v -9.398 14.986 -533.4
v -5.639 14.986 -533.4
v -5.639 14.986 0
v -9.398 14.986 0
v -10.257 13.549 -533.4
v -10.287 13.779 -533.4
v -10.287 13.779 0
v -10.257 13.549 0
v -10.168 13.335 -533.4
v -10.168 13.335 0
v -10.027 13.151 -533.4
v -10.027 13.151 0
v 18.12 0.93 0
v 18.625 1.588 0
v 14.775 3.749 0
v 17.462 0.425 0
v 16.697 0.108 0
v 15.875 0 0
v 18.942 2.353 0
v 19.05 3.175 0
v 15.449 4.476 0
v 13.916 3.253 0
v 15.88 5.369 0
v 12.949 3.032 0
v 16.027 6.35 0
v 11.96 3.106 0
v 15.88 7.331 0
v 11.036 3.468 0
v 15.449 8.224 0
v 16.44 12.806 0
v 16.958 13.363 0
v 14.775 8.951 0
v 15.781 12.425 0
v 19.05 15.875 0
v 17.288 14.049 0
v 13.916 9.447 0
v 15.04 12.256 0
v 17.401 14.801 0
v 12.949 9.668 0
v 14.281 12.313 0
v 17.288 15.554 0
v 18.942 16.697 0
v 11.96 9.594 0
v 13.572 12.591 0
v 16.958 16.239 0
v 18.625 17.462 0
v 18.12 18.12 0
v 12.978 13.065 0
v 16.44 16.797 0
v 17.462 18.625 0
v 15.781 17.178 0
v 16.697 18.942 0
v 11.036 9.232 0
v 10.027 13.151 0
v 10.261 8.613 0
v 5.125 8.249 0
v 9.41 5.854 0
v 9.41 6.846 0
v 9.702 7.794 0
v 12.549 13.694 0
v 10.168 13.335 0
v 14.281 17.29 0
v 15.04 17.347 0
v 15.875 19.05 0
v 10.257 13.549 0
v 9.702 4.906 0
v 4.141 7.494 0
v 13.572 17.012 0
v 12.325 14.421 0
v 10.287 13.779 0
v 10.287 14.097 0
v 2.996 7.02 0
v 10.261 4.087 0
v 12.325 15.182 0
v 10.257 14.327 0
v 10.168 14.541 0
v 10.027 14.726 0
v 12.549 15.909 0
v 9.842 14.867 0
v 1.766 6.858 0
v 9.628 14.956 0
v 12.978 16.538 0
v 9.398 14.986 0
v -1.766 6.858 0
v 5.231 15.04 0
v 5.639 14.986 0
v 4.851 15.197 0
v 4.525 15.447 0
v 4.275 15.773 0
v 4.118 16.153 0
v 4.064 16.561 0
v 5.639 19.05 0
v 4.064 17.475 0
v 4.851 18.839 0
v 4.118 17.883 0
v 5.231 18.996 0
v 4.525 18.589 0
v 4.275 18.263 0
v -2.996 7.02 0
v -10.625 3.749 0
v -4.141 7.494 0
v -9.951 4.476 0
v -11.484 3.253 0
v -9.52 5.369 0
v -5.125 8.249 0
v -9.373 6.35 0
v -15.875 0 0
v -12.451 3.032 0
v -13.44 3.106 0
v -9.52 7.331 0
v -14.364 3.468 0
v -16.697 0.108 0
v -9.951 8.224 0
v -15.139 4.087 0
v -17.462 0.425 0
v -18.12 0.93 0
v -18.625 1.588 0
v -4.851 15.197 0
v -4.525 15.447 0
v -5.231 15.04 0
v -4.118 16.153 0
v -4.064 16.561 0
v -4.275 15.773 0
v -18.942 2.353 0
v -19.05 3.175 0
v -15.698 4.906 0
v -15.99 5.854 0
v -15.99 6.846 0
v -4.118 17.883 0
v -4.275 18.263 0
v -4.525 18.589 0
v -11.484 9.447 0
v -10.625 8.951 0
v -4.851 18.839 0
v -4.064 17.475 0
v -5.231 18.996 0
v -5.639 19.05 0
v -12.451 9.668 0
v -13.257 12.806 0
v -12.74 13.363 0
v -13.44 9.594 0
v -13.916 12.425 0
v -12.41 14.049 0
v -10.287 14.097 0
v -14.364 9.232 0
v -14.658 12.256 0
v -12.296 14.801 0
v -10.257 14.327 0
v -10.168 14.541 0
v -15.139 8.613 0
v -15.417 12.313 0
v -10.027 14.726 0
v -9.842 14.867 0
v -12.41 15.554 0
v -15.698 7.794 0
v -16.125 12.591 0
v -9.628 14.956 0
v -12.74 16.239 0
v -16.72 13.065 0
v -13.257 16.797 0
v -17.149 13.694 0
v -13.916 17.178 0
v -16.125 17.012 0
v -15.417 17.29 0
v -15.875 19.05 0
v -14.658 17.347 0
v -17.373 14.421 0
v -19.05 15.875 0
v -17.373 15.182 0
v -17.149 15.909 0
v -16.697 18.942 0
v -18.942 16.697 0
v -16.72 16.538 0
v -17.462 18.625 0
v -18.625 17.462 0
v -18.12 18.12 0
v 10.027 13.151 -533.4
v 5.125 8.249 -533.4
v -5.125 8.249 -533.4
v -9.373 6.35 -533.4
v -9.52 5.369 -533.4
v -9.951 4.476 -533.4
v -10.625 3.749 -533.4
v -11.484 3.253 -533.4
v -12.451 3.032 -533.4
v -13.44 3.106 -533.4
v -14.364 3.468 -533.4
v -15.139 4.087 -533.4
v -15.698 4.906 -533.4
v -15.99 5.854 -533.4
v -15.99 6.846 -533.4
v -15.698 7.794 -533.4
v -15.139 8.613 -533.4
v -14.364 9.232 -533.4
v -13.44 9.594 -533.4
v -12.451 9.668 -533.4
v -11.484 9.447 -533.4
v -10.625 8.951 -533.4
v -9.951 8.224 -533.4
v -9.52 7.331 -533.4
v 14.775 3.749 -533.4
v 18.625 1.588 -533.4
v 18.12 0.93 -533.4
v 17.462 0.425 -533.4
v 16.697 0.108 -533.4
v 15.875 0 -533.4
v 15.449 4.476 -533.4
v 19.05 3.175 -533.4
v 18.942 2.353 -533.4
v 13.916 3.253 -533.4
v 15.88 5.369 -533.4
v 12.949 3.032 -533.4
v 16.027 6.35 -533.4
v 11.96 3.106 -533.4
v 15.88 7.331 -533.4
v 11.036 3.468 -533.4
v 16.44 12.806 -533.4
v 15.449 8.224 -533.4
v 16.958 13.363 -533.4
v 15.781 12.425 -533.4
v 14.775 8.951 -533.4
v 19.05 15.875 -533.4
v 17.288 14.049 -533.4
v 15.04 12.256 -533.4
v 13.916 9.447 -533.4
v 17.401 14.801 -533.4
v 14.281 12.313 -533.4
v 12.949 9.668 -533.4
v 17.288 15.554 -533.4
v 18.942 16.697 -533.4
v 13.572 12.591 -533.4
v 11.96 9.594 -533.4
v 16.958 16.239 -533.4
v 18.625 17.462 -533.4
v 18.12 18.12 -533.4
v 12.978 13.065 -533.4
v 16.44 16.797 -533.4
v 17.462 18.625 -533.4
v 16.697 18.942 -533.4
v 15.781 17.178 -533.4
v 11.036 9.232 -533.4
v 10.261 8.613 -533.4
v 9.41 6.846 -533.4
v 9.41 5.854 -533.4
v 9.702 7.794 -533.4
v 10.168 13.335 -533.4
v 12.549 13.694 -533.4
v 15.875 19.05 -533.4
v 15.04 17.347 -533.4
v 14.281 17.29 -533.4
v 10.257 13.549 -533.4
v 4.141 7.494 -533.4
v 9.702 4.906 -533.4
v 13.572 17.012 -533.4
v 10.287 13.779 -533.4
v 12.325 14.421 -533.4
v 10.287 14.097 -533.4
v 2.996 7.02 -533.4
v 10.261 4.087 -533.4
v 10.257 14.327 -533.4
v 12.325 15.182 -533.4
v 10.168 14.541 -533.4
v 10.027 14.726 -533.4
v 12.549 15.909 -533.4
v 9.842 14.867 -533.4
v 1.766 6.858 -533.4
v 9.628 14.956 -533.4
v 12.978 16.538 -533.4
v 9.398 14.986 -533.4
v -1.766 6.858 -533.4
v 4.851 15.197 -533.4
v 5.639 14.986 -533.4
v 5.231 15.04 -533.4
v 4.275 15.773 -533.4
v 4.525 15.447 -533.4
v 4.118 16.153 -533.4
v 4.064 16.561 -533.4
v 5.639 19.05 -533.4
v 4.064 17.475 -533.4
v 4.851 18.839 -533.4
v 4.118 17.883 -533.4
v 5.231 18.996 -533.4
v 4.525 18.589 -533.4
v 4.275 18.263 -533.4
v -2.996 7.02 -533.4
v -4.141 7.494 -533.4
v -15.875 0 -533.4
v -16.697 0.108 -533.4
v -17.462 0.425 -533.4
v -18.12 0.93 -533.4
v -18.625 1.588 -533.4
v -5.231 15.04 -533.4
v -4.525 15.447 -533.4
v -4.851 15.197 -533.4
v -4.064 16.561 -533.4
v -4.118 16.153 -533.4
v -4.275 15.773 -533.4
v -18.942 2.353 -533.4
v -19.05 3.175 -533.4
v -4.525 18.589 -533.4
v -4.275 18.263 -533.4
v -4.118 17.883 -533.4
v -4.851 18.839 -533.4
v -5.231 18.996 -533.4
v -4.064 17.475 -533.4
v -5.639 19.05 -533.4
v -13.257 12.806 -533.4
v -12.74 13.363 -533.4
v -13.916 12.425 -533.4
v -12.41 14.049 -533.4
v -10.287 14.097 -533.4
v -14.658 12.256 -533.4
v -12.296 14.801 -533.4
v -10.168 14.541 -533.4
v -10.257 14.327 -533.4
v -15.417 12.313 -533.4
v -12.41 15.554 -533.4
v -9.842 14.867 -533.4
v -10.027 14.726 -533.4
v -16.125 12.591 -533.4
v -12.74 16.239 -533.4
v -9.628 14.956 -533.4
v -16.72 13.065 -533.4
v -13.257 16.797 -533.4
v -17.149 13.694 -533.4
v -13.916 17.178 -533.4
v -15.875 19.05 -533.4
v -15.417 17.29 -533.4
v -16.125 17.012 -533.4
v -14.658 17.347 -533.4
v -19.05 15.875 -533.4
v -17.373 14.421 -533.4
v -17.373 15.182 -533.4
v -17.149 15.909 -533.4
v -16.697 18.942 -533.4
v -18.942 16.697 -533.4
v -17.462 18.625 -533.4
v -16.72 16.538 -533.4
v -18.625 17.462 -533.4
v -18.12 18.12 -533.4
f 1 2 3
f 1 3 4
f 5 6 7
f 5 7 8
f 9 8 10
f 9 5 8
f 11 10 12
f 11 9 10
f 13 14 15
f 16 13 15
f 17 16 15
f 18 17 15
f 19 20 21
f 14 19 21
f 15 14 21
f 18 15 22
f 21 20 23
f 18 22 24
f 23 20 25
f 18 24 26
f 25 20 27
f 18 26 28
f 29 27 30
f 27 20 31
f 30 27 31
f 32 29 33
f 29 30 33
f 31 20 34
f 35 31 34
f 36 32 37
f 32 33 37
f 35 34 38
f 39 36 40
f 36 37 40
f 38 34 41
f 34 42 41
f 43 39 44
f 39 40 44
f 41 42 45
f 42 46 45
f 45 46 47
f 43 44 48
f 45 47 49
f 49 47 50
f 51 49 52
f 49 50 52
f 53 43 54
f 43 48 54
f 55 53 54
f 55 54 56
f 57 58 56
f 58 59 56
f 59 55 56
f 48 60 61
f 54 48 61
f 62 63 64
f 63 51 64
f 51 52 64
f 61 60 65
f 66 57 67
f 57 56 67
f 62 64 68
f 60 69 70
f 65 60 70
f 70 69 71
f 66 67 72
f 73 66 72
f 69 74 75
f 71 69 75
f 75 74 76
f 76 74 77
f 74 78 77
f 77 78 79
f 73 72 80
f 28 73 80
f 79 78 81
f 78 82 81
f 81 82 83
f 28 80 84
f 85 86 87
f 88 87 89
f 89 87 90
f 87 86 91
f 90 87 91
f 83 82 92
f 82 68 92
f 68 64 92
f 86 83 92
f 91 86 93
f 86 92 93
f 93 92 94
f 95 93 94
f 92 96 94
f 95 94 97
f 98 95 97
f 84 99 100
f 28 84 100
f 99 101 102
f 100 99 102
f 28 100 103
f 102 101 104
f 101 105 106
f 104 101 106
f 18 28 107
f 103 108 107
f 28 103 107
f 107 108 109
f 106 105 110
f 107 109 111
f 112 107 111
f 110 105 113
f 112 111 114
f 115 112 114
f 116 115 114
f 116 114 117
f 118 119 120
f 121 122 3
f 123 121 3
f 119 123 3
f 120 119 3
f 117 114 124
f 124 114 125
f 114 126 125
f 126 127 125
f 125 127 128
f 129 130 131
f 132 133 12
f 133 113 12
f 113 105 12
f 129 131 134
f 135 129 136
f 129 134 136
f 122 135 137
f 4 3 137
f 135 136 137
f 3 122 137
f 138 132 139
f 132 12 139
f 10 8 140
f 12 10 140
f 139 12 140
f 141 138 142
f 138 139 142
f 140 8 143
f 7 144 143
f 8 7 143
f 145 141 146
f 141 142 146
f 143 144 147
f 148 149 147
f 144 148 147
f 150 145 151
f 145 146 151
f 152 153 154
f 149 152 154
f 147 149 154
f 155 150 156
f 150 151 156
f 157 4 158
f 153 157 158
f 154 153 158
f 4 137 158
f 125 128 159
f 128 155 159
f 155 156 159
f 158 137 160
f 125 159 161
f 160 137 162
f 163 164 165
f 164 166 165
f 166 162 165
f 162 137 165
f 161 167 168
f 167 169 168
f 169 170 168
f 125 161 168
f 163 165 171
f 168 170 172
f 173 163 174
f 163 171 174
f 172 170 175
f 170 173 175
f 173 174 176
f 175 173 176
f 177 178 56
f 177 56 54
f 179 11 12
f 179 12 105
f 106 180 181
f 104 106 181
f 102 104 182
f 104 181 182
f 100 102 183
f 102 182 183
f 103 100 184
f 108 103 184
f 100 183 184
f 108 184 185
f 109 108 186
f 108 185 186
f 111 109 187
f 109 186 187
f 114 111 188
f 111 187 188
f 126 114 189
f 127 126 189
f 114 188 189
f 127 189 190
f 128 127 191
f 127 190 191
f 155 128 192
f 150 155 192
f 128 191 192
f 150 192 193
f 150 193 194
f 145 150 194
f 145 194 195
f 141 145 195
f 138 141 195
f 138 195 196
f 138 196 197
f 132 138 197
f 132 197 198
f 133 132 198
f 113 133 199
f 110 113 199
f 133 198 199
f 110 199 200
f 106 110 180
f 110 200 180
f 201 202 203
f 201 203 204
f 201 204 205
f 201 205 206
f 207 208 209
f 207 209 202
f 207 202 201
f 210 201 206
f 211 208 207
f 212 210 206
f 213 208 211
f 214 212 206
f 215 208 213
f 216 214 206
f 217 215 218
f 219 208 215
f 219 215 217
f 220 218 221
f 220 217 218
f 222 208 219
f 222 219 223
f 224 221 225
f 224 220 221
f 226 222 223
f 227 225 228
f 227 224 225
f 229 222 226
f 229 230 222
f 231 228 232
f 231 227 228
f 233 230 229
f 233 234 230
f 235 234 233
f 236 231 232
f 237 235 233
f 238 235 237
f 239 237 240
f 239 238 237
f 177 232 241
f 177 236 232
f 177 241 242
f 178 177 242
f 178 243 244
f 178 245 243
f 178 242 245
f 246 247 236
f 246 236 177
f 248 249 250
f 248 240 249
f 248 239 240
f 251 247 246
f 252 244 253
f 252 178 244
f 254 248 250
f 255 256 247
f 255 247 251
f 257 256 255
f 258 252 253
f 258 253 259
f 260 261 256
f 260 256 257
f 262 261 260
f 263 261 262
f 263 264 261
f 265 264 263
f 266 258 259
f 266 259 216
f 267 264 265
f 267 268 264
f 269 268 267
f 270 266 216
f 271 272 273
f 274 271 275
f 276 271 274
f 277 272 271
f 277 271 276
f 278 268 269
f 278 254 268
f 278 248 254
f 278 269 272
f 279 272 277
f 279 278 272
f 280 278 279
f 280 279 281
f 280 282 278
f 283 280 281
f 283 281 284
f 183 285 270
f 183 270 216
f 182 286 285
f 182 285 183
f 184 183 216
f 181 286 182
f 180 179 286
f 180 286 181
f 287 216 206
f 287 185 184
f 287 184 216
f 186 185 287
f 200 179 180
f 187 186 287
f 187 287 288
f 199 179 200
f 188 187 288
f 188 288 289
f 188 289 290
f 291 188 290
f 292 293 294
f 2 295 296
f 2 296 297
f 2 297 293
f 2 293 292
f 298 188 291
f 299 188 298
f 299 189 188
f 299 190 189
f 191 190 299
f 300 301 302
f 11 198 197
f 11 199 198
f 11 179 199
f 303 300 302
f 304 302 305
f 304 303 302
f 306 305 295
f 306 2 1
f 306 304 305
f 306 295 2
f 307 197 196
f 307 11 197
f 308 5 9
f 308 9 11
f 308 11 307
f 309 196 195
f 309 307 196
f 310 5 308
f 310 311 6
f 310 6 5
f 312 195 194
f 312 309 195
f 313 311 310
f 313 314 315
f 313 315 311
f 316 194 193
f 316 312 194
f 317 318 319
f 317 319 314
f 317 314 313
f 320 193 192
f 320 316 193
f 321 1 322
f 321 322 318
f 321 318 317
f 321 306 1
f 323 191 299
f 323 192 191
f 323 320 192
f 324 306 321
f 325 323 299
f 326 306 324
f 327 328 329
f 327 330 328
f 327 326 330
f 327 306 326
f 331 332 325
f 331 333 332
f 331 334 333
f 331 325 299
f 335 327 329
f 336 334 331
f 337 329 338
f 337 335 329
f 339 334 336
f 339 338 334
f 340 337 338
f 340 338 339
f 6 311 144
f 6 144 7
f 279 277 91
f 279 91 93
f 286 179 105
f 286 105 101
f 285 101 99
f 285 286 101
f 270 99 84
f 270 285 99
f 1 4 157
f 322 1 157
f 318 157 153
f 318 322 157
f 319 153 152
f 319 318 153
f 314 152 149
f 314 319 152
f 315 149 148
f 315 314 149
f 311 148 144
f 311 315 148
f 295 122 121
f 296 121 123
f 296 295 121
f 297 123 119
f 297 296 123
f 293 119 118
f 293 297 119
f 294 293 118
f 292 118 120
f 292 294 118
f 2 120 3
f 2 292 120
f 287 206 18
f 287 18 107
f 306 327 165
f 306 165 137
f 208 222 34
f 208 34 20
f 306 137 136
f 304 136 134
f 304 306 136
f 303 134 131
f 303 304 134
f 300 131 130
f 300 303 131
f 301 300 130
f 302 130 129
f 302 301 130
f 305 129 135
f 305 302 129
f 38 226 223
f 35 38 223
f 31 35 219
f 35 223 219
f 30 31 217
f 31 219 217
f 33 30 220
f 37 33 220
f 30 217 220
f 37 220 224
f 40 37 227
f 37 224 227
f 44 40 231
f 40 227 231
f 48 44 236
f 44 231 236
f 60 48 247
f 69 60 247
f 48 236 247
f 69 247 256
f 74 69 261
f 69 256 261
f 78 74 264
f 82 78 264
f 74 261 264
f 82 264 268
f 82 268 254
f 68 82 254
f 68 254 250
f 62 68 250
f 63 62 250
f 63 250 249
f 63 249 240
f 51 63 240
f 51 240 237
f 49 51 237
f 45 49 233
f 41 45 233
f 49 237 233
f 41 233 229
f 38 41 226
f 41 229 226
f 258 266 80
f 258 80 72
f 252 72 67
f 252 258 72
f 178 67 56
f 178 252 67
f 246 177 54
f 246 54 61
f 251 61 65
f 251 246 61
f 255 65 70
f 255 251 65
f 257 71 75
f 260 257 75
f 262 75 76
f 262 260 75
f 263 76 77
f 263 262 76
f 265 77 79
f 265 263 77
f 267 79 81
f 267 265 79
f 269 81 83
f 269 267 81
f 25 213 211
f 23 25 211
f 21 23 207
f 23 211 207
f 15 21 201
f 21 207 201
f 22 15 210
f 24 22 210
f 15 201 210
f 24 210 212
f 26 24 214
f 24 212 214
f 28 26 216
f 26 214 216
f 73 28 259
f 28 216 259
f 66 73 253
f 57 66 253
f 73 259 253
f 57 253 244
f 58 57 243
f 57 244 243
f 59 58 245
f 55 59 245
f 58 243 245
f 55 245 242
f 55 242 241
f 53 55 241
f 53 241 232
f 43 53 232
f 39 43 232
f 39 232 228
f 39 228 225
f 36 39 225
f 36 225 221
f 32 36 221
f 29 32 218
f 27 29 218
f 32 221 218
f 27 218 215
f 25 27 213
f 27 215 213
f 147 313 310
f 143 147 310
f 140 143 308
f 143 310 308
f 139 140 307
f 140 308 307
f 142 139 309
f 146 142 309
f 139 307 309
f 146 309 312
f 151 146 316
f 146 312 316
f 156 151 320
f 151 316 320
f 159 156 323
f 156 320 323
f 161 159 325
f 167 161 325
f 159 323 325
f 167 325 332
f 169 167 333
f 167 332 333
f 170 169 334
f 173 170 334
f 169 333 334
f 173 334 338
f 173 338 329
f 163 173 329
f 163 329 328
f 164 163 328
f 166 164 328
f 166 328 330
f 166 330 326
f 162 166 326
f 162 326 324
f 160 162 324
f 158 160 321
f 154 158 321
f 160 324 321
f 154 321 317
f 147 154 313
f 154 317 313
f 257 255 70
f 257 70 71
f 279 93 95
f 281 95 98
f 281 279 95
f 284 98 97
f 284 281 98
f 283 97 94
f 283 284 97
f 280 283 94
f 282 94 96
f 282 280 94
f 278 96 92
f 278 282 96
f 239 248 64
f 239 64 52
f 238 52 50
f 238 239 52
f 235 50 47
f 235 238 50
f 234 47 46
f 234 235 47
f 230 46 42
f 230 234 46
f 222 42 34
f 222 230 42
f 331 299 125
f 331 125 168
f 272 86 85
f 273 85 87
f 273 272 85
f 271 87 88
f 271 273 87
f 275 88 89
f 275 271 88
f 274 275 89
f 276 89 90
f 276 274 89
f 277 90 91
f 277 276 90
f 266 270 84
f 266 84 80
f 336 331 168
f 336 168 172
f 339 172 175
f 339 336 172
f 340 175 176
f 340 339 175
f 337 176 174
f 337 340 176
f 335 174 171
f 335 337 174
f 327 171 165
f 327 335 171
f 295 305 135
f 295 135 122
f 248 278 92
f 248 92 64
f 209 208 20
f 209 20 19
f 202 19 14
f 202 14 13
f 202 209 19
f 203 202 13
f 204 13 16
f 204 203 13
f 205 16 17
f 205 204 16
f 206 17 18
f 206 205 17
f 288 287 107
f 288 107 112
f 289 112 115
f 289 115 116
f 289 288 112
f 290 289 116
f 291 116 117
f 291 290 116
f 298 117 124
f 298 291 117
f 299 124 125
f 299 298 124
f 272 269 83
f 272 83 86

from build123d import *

# Parameters (mm, degrees)
SKETCH1_R           = 2.5527
SKETCH1_R_2         = 3.3274
BOSS_EXTRUDE1_DEPTH = 533.4


with BuildPart() as part:
    # Sketch1 → Boss-Extrude1 (new body)
    with BuildSketch(Plane(origin=(0, 0, -533.4), x_dir=(-1, 0, 0), z_dir=(0, 0, -1))):
        with BuildLine():
            Line((19.05, 3.175), (19.05, 15.875))
            ThreePointArc((19.05, 15.875), (18.12006403, 18.12006403), (15.875, 19.05))
            Line((15.875, 19.05), (5.6388, 19.05))
            ThreePointArc((5.6388, 19.05), (4.525248241, 18.588751759), (4.064, 17.4752))
            Line((4.064, 17.4752), (4.064, 16.5608))
            ThreePointArc((4.064, 16.5608), (4.525248241, 15.447248241), (5.6388, 14.986))
            Line((5.6388, 14.986), (9.398, 14.986))
            ThreePointArc((9.398, 14.986), (10.026617928, 14.725617928), (10.287, 14.097))
            Line((10.287, 14.097), (10.287, 13.779435857))
            ThreePointArc((10.287, 13.779435857), (10.219328904, 13.439230286), (10.026617928, 13.150817928))
            Line((10.026617928, 13.150817928), (5.124984211, 8.249184211))
            ThreePointArc((5.124984211, 8.249184211), (3.584038188, 7.219556996), (1.766368421, 6.858))
            Line((1.766368421, 6.858), (-1.766368421, 6.858))
            ThreePointArc((-1.766368421, 6.858), (-3.584038188, 7.219556996), (-5.124984211, 8.249184211))
            Line((-5.124984211, 8.249184211), (-10.026617928, 13.150817928))
            ThreePointArc((-10.026617928, 13.150817928), (-10.219328904, 13.439230286), (-10.287, 13.779435857))
            Line((-10.287, 13.779435857), (-10.287, 14.097))
            ThreePointArc((-10.287, 14.097), (-10.026617928, 14.725617928), (-9.398, 14.986))
            Line((-9.398, 14.986), (-5.6388, 14.986))
            ThreePointArc((-5.6388, 14.986), (-4.525248241, 15.447248241), (-4.064, 16.5608))
            Line((-4.064, 16.5608), (-4.064, 17.4752))
            ThreePointArc((-4.064, 17.4752), (-4.525248241, 18.588751759), (-5.6388, 19.05))
            Line((-5.6388, 19.05), (-15.875, 19.05))
            ThreePointArc((-15.875, 19.05), (-18.12006403, 18.12006403), (-19.05, 15.875))
            Line((-19.05, 15.875), (-19.05, 3.175))
            ThreePointArc((-19.05, 3.175), (-18.12006403, 0.92993597), (-15.875, 0))
            Line((-15.875, 0), (15.875, 0))
            ThreePointArc((15.875, 0), (18.12006403, 0.92993597), (19.05, 3.175))
        make_face()
        with Locations(Location((14.848797074, 14.801432678, 0), (0, 0, 180))):
            Circle(SKETCH1_R, mode=Mode.SUBTRACT)
        with Locations(Location((12.7, 6.35, 0), (0, 0, 180))):
            Circle(SKETCH1_R_2, mode=Mode.SUBTRACT)
        with Locations(Location((-12.7, 6.35, 0), (0, 0, 180))):
            Circle(SKETCH1_R_2, mode=Mode.SUBTRACT)
        with Locations(Location((-14.848797074, 14.801432678, 0), (0, 0, 180))):
            Circle(SKETCH1_R, mode=Mode.SUBTRACT)
    extrude(amount=-BOSS_EXTRUDE1_DEPTH)


solid = part.part
